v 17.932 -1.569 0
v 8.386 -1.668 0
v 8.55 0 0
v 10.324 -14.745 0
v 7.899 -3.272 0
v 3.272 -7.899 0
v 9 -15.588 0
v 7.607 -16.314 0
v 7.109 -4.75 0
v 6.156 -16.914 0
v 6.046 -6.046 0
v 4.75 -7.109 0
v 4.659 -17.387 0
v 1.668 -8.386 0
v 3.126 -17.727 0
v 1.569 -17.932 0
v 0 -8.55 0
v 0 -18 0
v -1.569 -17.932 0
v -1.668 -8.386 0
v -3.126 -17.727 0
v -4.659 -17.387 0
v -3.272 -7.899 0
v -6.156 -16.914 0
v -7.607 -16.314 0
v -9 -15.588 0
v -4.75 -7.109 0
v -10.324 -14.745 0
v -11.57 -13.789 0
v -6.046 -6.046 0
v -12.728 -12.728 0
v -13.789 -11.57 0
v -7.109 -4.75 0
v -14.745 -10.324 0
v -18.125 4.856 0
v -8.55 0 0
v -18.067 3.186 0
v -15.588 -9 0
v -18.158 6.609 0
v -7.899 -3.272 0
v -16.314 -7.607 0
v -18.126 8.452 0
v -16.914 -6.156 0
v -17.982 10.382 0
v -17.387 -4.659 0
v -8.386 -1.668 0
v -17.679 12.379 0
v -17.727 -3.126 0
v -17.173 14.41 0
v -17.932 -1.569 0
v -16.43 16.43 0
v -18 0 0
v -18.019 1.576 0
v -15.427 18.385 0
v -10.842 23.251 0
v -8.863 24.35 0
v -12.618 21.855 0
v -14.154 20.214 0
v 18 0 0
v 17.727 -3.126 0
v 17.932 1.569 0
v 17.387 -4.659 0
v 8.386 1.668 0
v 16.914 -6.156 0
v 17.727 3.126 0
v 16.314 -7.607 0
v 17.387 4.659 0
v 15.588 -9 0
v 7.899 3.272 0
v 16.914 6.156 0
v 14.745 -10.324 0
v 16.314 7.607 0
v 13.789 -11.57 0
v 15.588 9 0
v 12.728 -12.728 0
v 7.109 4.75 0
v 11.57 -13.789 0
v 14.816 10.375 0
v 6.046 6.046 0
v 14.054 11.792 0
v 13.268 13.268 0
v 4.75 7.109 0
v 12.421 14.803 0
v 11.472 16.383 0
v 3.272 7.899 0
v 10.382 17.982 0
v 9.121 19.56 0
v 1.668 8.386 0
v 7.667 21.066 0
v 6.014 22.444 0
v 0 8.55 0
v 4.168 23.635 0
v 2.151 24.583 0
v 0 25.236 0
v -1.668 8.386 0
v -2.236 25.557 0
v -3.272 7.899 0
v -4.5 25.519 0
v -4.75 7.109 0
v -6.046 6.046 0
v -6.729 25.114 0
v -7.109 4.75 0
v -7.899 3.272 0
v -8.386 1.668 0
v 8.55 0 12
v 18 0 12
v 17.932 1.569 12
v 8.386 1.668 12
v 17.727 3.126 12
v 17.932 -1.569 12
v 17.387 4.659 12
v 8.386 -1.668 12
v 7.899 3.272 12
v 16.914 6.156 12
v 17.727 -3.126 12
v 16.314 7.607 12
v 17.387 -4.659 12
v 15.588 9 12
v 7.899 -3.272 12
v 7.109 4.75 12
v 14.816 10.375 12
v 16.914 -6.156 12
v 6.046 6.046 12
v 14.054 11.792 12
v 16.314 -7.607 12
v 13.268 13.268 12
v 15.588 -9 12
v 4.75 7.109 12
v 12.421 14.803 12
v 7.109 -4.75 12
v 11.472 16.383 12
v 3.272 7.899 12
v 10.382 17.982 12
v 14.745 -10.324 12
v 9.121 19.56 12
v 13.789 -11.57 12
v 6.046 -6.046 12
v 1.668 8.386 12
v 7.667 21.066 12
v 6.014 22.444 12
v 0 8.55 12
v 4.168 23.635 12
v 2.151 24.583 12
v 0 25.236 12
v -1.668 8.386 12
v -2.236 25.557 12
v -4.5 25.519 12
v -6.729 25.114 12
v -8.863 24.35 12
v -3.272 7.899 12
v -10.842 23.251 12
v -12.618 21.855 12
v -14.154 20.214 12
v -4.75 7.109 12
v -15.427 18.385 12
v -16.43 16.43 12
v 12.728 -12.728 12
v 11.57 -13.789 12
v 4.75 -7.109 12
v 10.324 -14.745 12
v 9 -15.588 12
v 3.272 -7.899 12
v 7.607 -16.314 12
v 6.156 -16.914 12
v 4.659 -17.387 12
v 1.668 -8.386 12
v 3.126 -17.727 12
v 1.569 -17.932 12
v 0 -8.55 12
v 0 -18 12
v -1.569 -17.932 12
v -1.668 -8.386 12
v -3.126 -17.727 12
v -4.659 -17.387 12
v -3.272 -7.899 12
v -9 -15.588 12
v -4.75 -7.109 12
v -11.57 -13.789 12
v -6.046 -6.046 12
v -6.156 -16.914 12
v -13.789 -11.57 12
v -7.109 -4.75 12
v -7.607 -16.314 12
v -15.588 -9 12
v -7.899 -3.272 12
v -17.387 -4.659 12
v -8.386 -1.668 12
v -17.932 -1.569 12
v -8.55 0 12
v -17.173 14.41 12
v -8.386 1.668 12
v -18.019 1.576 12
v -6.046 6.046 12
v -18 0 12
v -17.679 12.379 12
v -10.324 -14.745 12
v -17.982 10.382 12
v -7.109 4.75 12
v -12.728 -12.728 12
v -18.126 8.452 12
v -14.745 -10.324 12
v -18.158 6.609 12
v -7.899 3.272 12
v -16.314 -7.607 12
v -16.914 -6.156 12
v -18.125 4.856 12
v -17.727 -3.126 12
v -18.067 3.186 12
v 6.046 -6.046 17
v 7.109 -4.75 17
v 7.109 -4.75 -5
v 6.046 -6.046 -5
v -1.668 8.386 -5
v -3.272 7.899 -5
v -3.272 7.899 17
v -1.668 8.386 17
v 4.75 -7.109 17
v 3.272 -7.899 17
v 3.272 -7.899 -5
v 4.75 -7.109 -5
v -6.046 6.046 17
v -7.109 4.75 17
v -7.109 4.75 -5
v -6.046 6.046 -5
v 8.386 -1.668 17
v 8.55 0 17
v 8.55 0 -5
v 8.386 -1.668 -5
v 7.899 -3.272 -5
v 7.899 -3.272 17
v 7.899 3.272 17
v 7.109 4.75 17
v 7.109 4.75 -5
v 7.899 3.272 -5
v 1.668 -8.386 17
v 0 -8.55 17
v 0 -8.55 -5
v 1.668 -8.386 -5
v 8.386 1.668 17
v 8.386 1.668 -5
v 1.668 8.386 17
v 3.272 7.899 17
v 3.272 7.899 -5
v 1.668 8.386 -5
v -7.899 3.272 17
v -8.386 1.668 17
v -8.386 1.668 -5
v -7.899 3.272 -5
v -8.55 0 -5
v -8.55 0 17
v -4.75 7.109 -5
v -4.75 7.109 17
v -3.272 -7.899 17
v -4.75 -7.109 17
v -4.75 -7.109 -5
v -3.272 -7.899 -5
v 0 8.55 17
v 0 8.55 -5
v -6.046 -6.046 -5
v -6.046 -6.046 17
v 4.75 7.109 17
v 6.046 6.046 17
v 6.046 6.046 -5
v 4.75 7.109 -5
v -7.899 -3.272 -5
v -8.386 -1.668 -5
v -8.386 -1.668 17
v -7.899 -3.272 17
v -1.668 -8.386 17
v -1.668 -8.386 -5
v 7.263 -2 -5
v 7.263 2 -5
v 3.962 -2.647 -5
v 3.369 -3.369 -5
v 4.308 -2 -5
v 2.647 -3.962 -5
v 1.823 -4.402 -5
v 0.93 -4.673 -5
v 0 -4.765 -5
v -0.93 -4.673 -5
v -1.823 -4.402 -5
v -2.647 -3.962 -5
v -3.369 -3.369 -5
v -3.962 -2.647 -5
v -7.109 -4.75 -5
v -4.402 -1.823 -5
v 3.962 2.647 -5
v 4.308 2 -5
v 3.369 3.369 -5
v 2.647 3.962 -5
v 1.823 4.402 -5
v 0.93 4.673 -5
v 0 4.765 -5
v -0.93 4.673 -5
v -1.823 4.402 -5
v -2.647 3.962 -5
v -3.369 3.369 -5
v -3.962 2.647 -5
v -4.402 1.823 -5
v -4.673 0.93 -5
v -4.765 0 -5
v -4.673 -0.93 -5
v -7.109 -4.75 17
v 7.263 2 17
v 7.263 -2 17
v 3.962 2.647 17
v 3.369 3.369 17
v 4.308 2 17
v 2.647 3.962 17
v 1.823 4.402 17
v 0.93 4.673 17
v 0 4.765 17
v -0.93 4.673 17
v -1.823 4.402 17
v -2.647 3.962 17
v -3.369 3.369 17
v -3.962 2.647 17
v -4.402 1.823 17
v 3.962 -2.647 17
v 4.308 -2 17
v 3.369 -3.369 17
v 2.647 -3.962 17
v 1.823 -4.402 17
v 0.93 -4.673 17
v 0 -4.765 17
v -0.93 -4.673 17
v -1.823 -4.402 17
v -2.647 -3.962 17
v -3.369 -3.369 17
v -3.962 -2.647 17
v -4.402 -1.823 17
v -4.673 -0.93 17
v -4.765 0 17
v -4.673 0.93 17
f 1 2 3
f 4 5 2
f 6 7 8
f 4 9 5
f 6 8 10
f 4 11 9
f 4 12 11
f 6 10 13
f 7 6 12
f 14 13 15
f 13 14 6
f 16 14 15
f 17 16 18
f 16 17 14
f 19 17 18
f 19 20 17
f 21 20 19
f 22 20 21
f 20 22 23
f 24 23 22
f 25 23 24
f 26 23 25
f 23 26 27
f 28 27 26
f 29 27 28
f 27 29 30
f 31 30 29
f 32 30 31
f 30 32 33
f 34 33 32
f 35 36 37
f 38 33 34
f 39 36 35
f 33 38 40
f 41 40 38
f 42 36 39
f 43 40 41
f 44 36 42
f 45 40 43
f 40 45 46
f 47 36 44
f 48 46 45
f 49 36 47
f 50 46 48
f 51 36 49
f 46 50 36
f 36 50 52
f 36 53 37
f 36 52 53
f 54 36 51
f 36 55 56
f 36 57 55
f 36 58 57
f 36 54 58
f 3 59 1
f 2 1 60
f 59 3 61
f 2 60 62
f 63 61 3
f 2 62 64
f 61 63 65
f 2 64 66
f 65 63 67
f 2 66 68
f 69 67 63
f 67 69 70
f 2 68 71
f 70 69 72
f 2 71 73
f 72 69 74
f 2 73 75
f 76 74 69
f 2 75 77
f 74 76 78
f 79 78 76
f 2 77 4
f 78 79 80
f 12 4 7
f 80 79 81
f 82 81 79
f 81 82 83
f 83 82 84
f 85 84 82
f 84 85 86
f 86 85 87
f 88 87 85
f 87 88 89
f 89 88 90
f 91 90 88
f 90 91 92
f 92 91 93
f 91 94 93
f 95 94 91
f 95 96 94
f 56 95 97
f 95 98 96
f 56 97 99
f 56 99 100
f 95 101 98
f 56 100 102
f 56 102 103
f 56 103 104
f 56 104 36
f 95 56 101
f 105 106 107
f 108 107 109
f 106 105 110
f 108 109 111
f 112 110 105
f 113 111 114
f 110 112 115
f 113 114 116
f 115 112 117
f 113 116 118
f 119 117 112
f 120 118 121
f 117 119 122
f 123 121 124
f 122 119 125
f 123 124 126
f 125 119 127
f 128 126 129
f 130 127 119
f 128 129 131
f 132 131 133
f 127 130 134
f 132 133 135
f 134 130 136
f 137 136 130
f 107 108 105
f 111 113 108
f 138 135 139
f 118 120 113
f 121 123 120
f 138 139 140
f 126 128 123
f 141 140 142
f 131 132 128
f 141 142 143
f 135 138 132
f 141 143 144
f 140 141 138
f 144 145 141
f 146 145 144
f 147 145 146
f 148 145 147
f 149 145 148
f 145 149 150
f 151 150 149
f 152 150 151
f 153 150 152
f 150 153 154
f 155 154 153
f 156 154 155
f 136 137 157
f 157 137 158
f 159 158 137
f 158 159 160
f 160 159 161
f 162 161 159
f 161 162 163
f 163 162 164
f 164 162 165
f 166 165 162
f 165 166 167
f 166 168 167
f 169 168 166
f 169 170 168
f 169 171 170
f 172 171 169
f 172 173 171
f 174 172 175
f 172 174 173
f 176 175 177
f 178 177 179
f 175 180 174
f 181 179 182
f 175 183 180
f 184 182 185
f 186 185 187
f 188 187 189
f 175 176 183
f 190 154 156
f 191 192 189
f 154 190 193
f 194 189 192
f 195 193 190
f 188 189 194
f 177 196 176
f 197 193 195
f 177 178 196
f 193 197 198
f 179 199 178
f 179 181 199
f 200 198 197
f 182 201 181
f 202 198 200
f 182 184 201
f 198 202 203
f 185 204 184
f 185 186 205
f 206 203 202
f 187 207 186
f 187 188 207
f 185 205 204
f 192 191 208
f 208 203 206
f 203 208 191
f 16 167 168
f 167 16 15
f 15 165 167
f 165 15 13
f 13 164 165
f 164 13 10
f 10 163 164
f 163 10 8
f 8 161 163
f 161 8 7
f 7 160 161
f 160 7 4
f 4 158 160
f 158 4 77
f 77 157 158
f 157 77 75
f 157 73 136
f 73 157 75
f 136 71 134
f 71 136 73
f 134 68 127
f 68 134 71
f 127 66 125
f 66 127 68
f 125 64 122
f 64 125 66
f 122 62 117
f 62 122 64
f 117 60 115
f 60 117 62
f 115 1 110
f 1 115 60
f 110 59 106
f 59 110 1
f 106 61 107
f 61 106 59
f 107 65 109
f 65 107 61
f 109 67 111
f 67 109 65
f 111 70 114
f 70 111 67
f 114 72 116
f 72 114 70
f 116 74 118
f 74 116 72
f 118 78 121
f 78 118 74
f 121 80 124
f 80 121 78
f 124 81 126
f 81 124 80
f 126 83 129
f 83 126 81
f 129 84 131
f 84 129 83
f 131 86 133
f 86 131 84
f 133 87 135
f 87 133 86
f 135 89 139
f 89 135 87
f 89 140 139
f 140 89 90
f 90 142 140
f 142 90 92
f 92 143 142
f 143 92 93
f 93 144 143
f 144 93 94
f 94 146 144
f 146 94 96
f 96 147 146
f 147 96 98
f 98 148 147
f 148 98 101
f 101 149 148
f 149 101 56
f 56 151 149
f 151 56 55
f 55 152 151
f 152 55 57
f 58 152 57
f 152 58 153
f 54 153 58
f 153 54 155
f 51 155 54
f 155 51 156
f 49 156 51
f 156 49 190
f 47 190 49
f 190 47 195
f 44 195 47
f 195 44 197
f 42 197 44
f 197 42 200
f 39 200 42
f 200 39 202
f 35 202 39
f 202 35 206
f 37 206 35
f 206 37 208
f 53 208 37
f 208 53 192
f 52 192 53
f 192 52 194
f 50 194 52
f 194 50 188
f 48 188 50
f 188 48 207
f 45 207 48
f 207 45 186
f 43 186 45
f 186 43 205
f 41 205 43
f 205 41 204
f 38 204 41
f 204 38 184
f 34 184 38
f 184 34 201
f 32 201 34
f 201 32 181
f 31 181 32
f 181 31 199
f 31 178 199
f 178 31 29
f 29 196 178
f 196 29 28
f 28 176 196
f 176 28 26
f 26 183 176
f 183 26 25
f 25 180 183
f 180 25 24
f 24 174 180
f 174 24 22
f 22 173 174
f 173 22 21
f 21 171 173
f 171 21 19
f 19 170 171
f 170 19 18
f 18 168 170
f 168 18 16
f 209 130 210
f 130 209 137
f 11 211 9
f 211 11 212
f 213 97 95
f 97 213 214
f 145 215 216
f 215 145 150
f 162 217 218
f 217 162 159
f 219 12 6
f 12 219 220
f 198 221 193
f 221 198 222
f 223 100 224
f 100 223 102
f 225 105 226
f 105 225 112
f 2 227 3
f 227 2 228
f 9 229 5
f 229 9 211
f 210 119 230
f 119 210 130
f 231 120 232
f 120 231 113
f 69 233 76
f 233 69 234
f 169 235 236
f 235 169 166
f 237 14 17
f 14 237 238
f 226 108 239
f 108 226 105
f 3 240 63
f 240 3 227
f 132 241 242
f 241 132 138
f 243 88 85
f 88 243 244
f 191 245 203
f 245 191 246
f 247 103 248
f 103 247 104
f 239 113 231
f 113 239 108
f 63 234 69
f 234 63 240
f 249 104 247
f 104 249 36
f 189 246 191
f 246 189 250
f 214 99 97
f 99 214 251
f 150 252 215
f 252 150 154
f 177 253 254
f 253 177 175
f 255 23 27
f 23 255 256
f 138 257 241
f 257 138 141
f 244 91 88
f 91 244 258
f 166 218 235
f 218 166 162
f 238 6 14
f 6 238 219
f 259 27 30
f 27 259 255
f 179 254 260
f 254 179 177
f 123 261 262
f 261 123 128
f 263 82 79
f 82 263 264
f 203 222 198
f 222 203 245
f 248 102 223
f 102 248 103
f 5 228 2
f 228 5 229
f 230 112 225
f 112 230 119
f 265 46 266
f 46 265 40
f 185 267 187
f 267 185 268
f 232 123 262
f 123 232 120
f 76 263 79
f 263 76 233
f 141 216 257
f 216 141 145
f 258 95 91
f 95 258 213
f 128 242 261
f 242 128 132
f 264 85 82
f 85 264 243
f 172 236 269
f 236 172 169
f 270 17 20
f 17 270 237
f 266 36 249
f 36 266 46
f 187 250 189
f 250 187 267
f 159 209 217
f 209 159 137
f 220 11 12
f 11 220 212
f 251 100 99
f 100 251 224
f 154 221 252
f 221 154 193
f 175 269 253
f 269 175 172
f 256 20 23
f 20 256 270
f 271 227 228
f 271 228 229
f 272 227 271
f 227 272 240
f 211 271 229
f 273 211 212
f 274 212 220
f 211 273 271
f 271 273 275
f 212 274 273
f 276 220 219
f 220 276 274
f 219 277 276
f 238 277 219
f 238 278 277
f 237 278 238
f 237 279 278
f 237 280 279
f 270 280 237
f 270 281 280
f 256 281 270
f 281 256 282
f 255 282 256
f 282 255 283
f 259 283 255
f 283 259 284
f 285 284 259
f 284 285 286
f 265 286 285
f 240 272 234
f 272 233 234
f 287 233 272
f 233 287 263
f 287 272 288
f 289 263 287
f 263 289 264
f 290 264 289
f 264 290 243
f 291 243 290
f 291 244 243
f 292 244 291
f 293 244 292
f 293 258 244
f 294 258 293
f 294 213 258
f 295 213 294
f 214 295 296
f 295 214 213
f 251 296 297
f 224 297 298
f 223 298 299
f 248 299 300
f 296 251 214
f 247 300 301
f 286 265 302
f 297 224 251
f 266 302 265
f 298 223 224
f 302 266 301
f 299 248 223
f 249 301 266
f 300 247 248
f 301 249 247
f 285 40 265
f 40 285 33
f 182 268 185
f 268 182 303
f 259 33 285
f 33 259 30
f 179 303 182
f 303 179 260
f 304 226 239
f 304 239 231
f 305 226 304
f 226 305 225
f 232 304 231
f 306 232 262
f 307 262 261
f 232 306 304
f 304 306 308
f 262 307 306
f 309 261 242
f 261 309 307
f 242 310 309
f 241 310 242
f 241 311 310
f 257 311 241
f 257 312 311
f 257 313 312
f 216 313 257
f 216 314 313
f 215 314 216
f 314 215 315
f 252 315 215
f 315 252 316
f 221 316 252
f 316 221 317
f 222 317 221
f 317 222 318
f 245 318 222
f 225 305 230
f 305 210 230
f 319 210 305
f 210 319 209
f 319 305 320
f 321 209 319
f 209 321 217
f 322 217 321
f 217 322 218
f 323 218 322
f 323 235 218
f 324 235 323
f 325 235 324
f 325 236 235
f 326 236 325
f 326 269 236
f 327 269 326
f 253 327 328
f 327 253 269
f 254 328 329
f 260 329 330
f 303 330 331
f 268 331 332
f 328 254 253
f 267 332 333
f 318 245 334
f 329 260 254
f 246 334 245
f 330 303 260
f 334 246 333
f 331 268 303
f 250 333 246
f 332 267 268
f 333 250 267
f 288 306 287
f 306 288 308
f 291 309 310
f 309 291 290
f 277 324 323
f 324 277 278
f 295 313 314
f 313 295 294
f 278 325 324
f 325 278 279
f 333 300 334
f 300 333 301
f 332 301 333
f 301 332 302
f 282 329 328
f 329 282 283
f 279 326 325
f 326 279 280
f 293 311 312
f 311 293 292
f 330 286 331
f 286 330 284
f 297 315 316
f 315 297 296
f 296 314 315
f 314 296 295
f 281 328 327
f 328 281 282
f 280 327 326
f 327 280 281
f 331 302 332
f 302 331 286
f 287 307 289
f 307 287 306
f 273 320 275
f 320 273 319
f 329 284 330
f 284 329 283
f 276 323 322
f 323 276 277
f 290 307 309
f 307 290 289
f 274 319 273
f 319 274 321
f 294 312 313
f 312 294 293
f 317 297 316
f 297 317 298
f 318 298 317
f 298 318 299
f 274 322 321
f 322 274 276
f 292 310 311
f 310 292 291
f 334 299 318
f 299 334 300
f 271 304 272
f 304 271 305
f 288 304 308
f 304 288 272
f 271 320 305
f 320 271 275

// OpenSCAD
$fn = 32;

// ----------------------------------------------------------------------
// Cam: base radius 18 mm with a 8 mm lift over 150 degrees
// ----------------------------------------------------------------------

// --- parameters (mm) ---
base_r = 18;              // base radius
lift = 8;                 // lift height above the base radius
lift_span = 150;          // angular width of the lift
lift_start = 30;          // angle where the lift starts
cam_t = 12;               // cam plate thickness
hub_d = 17.1;             // hub diameter
hub_h = 22;               // hub height
bore_d = 9.53;            // bore
key_w = 4;                // keyway width
key_depth = 1.79;         // keyway depth

cam_profile = [[18, 0], [17.932, 1.569], [17.727, 3.126], [17.387, 4.659], [16.914, 6.156], [16.314, 7.607], [15.588, 9], [14.816, 10.375], [14.054, 11.792], [13.268, 13.268], [12.421, 14.803], [11.472, 16.383], [10.382, 17.982], [9.121, 19.56], [7.667, 21.066], [6.014, 22.444], [4.168, 23.635], [2.151, 24.583], [0, 25.236], [-2.236, 25.557], [-4.5, 25.519], [-6.729, 25.114], [-8.863, 24.35], [-10.842, 23.251], [-12.618, 21.855], [-14.154, 20.214], [-15.427, 18.385], [-16.43, 16.43], [-17.173, 14.41], [-17.679, 12.379], [-17.982, 10.382], [-18.126, 8.452], [-18.158, 6.609], [-18.125, 4.856], [-18.067, 3.186], [-18.019, 1.576], [-18, 0], [-17.932, -1.569], [-17.727, -3.126], [-17.387, -4.659], [-16.914, -6.156], [-16.314, -7.607], [-15.588, -9], [-14.745, -10.324], [-13.789, -11.57], [-12.728, -12.728], [-11.57, -13.789], [-10.324, -14.745], [-9, -15.588], [-7.607, -16.314], [-6.156, -16.914], [-4.659, -17.387], [-3.126, -17.727], [-1.569, -17.932], [0, -18], [1.569, -17.932], [3.126, -17.727], [4.659, -17.387], [6.156, -16.914], [7.607, -16.314], [9, -15.588], [10.324, -14.745], [11.57, -13.789], [12.728, -12.728], [13.789, -11.57], [14.745, -10.324], [15.588, -9], [16.314, -7.607], [16.914, -6.156], [17.387, -4.659], [17.727, -3.126], [17.932, -1.569]];

difference() {
  union() {
    linear_extrude(height = cam_t) polygon(cam_profile);
    /* hub, proud of the cam plate on both sides */
    translate([0, 0, -5]) cylinder(h = hub_h, d = hub_d);
  }
  /* bore through the hub, 2.5 mm clear on both faces */
  translate([0, 0, -7.5]) cylinder(h = hub_h + 5, d = bore_d);
  /* keyway, milled through the whole hub */
  translate([2.973, -2, -7.5]) cube([4.29, 4, 27]);
}
